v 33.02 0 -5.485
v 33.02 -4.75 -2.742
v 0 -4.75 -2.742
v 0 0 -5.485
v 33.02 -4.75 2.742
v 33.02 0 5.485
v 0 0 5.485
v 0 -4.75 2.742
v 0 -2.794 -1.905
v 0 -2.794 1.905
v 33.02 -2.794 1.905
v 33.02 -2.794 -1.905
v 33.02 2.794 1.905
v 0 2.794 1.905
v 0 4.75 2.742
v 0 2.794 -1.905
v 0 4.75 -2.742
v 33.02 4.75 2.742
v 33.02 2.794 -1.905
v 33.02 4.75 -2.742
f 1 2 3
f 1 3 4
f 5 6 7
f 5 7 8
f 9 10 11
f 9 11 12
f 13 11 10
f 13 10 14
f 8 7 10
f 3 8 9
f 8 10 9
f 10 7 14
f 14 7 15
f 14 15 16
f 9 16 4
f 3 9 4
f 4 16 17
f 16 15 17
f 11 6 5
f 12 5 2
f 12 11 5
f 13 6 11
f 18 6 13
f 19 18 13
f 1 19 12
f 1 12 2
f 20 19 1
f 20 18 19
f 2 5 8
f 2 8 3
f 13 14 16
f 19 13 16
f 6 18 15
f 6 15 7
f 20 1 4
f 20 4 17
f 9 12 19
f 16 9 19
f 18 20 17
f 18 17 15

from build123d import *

# Parameters (mm, degrees)
SKETCH1_W           = 3.81
SKETCH1_H           = 5.588
BOSS_EXTRUDE1_DEPTH = 33.02


with BuildPart() as part:
    # Sketch1 → Boss-Extrude1 (new body)
    with BuildSketch(Plane(origin=(0, 0, 0), x_dir=(0, 0, -1), z_dir=(1, 0, 0))):
        Polygon((-2.742413779, 4.75), (-5.484827557, 0), (-2.742413779, -4.75), (2.742413779, -4.75), (5.484827557, 0), (2.742413779, 4.75), align=None)
        Rectangle(SKETCH1_W, SKETCH1_H, mode=Mode.SUBTRACT)
    extrude(amount=BOSS_EXTRUDE1_DEPTH)


solid = part.part
